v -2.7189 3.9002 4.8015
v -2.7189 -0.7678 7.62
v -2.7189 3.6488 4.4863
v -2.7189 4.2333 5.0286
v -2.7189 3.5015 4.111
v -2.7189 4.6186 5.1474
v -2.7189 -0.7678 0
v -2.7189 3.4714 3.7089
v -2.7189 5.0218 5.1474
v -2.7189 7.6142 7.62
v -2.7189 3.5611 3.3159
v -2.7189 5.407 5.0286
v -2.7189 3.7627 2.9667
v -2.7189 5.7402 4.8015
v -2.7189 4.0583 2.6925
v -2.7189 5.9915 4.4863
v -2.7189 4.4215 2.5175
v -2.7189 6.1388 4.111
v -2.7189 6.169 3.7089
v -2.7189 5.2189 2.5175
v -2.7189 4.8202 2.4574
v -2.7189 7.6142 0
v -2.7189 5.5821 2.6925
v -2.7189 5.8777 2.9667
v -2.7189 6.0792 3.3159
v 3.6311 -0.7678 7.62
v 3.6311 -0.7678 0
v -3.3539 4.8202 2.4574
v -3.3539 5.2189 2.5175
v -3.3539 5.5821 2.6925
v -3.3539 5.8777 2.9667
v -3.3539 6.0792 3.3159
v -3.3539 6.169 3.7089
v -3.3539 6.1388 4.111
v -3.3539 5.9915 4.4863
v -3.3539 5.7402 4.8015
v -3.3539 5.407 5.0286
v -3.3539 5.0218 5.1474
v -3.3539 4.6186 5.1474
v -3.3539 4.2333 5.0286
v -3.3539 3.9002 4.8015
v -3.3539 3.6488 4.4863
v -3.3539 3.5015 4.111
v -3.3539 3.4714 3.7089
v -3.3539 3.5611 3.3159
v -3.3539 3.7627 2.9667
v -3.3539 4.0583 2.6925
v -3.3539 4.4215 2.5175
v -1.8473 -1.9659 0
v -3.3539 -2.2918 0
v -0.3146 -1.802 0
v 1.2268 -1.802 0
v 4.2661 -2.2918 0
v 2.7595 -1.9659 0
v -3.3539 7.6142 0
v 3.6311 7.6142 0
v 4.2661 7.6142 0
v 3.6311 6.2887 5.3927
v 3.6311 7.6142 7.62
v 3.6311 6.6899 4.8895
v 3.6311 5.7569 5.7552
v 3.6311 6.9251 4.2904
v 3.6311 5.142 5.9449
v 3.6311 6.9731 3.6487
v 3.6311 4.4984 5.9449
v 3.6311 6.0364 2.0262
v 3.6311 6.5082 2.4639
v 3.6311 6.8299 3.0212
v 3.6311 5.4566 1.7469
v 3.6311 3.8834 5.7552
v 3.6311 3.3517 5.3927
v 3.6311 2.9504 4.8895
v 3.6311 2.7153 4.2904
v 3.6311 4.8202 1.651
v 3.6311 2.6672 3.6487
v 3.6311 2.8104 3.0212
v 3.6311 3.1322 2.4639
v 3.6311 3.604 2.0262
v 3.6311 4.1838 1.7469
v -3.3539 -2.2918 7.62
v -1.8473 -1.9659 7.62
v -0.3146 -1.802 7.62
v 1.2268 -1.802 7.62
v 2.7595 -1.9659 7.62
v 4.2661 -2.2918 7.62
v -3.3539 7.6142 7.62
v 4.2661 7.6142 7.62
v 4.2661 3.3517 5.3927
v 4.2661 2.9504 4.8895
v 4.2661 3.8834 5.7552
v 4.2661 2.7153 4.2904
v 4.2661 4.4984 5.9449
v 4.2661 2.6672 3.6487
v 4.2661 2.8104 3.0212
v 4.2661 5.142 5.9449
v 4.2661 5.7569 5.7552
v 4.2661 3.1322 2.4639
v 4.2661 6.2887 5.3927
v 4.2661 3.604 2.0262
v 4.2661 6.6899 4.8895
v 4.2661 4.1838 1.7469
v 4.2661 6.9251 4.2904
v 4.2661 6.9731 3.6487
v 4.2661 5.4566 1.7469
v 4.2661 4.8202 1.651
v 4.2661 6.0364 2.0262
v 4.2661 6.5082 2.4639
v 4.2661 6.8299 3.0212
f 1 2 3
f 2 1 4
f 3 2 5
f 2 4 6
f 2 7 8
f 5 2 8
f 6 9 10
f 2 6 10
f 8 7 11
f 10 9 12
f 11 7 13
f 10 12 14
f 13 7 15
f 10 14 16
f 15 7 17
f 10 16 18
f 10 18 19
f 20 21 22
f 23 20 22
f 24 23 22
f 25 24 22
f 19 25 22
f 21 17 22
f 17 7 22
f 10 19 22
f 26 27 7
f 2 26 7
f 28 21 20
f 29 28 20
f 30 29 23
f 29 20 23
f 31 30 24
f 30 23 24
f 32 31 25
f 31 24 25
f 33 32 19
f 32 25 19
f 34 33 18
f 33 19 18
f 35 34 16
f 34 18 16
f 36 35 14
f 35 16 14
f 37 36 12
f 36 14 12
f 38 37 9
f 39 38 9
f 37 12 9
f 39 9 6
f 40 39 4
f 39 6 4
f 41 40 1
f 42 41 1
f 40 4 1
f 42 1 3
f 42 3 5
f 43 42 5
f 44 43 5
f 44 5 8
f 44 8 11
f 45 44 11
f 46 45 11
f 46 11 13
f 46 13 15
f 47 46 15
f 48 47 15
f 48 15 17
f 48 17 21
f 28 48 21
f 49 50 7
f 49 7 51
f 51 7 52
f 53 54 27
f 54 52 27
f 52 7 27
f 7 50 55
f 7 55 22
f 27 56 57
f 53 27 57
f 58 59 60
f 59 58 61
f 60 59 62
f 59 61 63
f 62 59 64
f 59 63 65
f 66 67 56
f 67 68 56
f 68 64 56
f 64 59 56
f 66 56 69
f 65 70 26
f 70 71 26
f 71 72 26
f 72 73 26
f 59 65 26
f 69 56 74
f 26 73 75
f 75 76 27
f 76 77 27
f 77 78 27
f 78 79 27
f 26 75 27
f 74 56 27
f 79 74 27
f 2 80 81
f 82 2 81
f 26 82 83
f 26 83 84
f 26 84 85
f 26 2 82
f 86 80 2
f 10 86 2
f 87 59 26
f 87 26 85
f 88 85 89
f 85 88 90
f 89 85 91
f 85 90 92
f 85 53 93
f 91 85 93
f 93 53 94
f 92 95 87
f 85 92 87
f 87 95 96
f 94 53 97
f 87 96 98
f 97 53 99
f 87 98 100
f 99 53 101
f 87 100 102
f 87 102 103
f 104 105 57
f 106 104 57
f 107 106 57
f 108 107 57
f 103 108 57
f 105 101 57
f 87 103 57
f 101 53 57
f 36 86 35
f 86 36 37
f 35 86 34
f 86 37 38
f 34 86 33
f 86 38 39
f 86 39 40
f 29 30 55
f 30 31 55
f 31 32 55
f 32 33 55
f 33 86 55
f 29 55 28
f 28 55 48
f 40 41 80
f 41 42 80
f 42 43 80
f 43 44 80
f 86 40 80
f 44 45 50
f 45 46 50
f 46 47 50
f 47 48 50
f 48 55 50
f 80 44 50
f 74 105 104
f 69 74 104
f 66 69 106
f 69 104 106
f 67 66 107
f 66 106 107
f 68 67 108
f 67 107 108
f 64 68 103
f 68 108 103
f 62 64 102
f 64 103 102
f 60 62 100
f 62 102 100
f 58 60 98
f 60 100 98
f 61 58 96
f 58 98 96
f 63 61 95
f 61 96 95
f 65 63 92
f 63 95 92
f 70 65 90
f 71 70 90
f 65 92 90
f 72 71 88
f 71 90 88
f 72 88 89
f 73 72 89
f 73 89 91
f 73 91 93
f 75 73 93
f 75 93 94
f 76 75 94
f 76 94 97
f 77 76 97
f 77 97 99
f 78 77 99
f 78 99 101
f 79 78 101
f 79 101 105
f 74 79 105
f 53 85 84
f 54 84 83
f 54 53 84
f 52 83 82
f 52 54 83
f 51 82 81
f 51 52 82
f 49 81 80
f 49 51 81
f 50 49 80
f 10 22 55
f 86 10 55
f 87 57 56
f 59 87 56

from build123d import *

# Parameters (mm, degrees)
BOSS_EXTRUDE1_DEPTH       = 7.62
F_6_32_TAPPED_HOLE1_D     = 2.7051
F_6_32_TAPPED_HOLE1_DEPTH = 0.635
CUT_EXTRUDE1_REACH        = 9.62
SKETCH6_R                 = 2.159
CUT_EXTRUDE2_DEPTH        = 8.62


with BuildPart() as part:
    # Sketch1 → Boss-Extrude1 (new body)
    with BuildSketch(Plane.XY):
        Polygon((-3.353873239, 7.61418662), (-3.353873239, -2.29181338), (4.266126761, -2.29181338), (4.266126761, 7.61418662), (3.631126761, 7.61418662), (3.631126761, -0.76781338), (-2.718873239, -0.76781338), (-2.718873239, 7.61418662), align=None)
    extrude(amount=BOSS_EXTRUDE1_DEPTH)

    # #6-32 Tapped Hole1
    with Locations(Plane.ZY.offset(3.353873239)):
        with Locations((3.81, 4.82018662)):
            Hole(F_6_32_TAPPED_HOLE1_D / 2, depth=F_6_32_TAPPED_HOLE1_DEPTH)

    # Sketch6 → Cut-Extrude1 (cut, up to next)
    with BuildSketch(Plane(origin=(4.266126761, 0, 0), x_dir=(0, 0, -1), z_dir=(1, 0, 0)), mode=Mode.PRIVATE) as cut_extrude1_sk1:
        with Locations((-3.81, 4.82018662)):
            Circle(SKETCH6_R)
    cut_extrude1_tool1 = extrude(cut_extrude1_sk1.sketch, amount=-CUT_EXTRUDE1_REACH, mode=Mode.PRIVATE) & part.part
    add(cut_extrude1_tool1.solids().sort_by_distance((4.266127, 4.820187, 3.81))[0], mode=Mode.SUBTRACT)

    # Sketch16 → Cut-Extrude2 (cut, through all)
    with BuildSketch(Plane(origin=(0, 0, 0), x_dir=(-1, 0, 0), z_dir=(0, 0, -1))):
        with BuildLine():
            Line((3.353873239, -2.29181338), (-4.266126761, -2.29181338))
            ThreePointArc((-4.266126761, -2.29181338), (-0.456126761, -1.781504099), (3.353873239, -2.29181338))
        make_face()
    extrude(amount=-CUT_EXTRUDE2_DEPTH, mode=Mode.SUBTRACT)


solid = part.part
